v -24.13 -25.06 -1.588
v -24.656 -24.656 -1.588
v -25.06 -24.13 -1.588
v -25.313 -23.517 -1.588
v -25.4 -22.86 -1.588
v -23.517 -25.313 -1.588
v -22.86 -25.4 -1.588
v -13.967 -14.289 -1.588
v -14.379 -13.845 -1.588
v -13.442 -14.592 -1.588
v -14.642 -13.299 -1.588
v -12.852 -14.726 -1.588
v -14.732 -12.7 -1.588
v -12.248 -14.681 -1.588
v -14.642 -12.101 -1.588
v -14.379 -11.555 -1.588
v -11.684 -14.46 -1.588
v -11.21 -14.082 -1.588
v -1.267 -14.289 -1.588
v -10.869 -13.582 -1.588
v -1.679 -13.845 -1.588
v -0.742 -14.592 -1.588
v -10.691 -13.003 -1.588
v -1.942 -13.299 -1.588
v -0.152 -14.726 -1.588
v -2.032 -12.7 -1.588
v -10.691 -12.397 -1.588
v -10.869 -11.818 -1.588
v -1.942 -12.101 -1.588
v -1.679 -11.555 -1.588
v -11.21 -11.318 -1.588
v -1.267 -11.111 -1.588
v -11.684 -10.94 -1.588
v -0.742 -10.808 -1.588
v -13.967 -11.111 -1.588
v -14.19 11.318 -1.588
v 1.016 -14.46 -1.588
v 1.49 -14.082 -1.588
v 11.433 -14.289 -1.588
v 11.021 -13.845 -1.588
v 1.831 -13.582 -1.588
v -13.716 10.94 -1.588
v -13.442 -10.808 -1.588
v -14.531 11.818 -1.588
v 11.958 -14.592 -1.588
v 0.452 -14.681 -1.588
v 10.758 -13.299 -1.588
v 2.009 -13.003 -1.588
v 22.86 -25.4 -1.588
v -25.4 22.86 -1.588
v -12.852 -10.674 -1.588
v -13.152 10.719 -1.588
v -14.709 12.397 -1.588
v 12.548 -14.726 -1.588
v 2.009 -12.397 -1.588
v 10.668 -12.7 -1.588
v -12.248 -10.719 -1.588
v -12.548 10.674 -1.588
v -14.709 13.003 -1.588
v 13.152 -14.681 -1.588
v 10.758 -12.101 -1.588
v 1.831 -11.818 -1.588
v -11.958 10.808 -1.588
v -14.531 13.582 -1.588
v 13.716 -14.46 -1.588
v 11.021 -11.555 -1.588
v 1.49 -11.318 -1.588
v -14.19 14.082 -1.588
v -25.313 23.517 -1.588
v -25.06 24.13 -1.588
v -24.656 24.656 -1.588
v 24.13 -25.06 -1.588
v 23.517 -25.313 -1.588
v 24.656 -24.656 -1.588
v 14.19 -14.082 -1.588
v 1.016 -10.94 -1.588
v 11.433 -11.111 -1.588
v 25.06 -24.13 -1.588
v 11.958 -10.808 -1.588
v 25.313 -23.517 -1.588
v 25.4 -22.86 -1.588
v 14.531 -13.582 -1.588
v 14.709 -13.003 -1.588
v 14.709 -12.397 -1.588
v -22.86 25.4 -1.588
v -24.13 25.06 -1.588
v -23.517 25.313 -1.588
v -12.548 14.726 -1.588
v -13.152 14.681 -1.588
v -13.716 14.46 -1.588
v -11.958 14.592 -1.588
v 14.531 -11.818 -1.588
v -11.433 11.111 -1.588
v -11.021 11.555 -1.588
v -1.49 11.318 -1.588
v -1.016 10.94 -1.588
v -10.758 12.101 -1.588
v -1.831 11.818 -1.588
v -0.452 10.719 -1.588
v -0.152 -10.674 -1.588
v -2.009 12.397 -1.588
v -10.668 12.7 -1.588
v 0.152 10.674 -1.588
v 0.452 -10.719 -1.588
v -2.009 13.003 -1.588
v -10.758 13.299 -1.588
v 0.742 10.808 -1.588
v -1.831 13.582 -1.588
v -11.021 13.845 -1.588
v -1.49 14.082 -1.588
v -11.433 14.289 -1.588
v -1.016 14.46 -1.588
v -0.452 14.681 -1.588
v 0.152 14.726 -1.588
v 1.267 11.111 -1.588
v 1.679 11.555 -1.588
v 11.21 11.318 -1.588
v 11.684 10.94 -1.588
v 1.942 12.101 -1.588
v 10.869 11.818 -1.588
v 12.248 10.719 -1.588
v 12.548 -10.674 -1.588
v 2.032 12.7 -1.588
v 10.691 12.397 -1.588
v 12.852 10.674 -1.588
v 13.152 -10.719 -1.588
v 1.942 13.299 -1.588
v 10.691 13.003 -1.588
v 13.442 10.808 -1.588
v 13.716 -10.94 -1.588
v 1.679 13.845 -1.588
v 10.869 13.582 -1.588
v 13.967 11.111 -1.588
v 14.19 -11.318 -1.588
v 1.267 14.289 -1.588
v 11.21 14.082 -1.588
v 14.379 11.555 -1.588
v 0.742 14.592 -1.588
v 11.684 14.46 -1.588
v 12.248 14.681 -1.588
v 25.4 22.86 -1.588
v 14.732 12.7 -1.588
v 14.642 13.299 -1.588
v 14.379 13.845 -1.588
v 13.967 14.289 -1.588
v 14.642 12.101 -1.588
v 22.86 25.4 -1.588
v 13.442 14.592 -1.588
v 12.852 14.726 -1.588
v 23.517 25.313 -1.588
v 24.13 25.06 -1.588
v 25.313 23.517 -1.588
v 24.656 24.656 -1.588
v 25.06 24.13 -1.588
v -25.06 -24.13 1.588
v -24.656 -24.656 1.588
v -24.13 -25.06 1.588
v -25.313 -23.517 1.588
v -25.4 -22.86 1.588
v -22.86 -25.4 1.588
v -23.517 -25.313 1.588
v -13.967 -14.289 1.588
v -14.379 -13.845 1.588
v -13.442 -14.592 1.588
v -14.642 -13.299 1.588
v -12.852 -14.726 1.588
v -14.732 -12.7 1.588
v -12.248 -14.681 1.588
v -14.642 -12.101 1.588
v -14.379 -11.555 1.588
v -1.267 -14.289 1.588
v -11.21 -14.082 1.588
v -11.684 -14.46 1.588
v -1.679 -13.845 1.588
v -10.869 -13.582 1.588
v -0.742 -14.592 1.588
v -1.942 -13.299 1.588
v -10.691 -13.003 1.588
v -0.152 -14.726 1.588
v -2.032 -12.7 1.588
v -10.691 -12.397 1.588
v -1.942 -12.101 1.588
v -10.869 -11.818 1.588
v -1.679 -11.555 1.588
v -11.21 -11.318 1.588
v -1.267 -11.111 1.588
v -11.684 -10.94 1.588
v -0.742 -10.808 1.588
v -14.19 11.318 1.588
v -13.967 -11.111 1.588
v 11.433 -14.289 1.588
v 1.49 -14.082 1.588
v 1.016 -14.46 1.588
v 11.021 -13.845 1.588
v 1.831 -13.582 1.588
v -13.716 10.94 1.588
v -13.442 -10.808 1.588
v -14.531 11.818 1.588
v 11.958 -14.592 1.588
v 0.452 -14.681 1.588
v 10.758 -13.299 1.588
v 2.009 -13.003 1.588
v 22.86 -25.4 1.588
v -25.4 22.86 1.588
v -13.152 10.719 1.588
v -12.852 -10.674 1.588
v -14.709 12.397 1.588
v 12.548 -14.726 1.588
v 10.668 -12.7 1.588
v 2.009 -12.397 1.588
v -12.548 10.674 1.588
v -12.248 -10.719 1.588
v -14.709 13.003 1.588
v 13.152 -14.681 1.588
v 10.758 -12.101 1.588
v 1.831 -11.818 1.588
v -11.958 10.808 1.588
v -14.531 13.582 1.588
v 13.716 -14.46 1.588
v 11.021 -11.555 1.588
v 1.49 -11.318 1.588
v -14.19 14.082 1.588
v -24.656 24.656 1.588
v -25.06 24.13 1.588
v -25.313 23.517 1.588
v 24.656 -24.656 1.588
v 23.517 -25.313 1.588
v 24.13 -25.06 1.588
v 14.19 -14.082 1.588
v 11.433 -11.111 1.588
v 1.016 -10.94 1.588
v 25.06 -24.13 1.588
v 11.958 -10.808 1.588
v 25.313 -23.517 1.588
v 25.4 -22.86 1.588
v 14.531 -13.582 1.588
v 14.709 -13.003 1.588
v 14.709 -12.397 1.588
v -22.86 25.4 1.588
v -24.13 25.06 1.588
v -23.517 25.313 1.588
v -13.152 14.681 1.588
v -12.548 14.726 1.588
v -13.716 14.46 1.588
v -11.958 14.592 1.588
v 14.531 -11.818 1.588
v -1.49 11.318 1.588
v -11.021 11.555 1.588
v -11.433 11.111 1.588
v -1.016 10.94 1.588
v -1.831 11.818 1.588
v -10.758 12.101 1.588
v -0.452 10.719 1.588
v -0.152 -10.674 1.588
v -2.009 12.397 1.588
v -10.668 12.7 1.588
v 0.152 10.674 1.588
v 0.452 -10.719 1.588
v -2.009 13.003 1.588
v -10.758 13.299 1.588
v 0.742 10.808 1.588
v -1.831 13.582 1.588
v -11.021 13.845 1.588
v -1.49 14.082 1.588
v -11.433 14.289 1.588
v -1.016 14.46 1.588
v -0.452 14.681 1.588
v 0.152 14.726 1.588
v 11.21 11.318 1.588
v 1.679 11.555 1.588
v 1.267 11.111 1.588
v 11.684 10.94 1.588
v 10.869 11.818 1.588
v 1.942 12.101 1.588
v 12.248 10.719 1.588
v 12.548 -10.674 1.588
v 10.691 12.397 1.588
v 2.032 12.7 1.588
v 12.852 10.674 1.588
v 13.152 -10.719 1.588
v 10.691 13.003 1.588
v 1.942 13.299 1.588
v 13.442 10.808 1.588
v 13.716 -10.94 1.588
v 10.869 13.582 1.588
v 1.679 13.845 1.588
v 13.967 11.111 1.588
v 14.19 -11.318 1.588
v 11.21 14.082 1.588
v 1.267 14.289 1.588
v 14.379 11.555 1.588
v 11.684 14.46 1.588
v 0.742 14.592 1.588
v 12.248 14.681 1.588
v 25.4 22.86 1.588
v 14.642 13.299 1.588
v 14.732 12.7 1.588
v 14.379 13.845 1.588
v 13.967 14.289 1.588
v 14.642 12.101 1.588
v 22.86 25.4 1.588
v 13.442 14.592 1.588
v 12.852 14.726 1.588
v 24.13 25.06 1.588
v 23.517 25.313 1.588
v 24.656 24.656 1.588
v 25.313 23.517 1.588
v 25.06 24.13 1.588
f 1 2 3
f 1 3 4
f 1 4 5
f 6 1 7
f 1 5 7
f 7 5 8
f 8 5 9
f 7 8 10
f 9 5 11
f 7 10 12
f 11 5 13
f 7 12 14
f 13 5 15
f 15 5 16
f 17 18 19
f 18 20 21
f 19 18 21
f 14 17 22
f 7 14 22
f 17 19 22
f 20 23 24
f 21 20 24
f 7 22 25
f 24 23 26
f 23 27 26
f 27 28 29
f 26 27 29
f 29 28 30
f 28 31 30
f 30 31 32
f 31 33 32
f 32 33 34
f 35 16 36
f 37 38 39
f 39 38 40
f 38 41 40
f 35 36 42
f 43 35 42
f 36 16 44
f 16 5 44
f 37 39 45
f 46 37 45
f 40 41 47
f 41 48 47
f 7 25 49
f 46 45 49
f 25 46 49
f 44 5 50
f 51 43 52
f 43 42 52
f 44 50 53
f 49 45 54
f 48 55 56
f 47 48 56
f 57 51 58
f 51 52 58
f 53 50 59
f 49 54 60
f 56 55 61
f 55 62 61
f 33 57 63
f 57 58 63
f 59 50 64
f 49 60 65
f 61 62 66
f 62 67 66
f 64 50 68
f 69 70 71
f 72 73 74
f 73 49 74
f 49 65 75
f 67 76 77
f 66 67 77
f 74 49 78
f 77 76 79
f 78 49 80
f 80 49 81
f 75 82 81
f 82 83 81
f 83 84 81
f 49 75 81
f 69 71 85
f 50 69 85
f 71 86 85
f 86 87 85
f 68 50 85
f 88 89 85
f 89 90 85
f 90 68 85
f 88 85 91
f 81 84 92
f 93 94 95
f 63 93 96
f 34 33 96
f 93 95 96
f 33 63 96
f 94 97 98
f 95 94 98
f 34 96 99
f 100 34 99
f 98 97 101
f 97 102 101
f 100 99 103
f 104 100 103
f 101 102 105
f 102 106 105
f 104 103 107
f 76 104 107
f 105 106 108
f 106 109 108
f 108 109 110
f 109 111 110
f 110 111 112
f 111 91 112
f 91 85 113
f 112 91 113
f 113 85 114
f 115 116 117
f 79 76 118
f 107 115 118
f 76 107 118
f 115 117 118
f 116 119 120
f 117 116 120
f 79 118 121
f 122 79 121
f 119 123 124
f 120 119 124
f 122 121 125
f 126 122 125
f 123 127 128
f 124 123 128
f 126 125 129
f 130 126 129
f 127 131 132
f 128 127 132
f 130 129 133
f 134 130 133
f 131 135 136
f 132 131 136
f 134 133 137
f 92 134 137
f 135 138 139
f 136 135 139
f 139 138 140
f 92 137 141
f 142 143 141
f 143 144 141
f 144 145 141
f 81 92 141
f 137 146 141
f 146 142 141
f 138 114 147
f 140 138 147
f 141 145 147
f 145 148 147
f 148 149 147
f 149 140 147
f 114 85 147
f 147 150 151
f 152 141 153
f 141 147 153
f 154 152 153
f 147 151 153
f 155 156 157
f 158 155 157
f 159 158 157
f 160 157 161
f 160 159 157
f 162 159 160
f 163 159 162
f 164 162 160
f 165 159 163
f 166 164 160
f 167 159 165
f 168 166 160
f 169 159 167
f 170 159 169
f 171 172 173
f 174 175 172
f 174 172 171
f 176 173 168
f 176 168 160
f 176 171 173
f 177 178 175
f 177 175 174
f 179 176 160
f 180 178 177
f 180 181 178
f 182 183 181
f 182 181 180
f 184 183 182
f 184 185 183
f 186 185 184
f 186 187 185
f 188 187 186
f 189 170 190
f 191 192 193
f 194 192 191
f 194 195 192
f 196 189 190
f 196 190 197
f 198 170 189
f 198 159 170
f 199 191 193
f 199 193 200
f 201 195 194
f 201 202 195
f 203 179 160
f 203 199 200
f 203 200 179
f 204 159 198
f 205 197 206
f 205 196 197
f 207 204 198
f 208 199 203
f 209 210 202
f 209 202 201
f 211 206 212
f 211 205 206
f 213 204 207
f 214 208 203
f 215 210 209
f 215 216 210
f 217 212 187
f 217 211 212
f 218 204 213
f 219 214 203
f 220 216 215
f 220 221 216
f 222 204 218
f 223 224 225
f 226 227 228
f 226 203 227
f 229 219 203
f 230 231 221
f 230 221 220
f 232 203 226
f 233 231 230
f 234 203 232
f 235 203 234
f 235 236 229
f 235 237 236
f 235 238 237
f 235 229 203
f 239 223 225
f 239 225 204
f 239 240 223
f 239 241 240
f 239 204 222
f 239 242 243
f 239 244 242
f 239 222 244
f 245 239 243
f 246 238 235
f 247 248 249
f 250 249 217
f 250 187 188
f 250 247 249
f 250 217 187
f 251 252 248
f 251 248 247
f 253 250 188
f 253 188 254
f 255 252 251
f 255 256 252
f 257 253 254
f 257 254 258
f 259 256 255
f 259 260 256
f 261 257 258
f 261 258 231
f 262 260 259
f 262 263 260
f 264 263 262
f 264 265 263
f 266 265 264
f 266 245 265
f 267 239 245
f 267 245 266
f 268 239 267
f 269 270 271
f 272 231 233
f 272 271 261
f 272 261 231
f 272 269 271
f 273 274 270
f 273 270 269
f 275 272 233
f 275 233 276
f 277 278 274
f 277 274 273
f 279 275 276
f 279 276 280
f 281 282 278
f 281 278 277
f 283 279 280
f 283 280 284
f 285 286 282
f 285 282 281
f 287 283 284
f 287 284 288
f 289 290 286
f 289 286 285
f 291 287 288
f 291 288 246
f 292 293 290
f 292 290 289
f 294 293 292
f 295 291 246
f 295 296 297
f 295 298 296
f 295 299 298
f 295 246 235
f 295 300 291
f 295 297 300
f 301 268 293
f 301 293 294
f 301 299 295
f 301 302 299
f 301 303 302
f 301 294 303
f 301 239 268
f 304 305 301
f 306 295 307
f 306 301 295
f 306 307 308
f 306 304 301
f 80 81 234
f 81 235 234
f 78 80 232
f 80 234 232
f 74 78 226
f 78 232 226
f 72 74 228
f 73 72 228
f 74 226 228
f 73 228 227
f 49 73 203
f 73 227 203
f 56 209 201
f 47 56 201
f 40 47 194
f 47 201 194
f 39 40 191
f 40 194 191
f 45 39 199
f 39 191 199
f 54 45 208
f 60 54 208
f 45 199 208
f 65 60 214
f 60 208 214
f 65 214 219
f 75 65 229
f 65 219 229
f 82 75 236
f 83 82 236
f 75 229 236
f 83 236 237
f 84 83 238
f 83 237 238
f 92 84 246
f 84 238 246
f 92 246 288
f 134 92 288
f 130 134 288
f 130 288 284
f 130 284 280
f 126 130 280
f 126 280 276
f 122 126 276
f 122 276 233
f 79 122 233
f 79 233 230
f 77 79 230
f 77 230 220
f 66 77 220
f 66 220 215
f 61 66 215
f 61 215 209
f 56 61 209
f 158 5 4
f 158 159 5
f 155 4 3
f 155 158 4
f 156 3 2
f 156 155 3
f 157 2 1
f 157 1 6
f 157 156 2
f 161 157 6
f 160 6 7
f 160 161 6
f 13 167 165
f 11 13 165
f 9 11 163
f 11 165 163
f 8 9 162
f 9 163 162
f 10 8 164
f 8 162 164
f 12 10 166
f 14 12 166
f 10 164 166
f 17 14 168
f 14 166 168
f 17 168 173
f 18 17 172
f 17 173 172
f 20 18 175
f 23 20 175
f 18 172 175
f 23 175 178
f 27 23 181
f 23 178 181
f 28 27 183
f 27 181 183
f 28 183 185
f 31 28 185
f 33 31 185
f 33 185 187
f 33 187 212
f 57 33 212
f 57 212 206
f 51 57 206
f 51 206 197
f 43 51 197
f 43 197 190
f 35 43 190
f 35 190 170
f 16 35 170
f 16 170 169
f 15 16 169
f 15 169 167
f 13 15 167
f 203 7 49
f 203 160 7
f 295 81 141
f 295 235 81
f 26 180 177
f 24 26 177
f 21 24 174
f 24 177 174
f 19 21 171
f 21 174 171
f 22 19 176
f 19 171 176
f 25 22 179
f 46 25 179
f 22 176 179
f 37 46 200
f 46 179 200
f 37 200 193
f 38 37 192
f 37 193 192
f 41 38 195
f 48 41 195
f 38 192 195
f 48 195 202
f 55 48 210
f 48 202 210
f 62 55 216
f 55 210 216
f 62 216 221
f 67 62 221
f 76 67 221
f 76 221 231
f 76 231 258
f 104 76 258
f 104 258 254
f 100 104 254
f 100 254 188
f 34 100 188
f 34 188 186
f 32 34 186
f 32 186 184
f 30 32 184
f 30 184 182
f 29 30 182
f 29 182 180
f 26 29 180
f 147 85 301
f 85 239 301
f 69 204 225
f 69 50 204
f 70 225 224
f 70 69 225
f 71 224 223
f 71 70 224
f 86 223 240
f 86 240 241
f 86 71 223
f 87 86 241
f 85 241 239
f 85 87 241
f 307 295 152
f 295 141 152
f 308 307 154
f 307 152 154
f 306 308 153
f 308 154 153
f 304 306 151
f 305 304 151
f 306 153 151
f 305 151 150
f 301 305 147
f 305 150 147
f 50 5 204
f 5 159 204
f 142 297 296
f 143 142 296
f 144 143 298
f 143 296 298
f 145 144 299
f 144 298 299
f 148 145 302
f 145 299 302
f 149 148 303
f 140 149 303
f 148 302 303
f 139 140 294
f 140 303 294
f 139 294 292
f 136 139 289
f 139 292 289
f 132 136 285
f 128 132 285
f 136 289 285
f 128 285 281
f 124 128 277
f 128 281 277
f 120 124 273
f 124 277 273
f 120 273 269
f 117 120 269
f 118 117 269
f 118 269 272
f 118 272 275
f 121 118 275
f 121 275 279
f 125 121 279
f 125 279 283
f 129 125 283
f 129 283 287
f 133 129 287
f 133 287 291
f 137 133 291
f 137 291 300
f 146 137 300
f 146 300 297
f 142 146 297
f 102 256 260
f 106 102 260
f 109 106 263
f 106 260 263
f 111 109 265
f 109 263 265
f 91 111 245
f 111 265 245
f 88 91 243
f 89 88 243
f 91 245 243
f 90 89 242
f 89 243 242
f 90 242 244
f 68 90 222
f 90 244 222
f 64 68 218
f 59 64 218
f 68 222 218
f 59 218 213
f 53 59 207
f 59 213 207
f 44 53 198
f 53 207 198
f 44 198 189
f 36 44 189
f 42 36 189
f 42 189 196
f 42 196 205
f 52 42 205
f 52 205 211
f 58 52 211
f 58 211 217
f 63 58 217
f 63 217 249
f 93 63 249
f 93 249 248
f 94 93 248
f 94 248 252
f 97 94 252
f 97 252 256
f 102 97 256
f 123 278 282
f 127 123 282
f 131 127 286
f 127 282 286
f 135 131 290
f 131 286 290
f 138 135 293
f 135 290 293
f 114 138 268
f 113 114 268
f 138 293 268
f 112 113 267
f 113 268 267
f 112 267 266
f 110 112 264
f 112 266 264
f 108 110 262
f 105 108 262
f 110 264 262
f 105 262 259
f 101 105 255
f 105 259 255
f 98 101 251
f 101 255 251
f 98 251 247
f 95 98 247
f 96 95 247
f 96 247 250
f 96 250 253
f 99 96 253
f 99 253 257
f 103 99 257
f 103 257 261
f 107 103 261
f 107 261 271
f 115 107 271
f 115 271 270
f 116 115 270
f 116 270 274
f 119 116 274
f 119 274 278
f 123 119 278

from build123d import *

# Parameters (mm, degrees)
SKETCH1_W           = 50.8
SKETCH1_H           = 50.8
BOSS_EXTRUDE1_DEPTH = 1.5875
FILLET1_R           = 2.54
SKETCH2_R           = 2.032
CUT_EXTRUDE1_DEPTH  = 37.061067996


with BuildPart() as part:
    # Sketch1 → Boss-Extrude1 (new, symmetric)
    with BuildSketch(Plane.XY):
        Rectangle(SKETCH1_W, SKETCH1_H)
    extrude(amount=BOSS_EXTRUDE1_DEPTH, both=True)

    # Fillet1
    fillet1_edges = [part.edges().sort_by_distance(p)[0] for p in [
        (25.4, -25.4, 0),
        (-25.4, -25.4, 0),
        (-25.4, 25.4, 0),
        (25.4, 25.4, 0),
    ]]
    fillet(fillet1_edges, radius=FILLET1_R)

    # Sketch2 → Cut-Extrude1 (cut, through all)
    with BuildSketch(Plane.XY.offset(1.5875)):
        with Locations((-12.7, 12.7)):
            Circle(SKETCH2_R)
        with Locations((0, 12.7)):
            Circle(SKETCH2_R)
        with Locations((12.7, 12.7)):
            Circle(SKETCH2_R)
        with Locations(Location((12.7, -12.7, 0), (0, 0, 180))):
            Circle(SKETCH2_R)
        with Locations(Location((0, -12.7, 0), (0, 0, 180))):
            Circle(SKETCH2_R)
        with Locations(Location((-12.7, -12.7, 0), (0, 0, 180))):
            Circle(SKETCH2_R)
    extrude(amount=-CUT_EXTRUDE1_DEPTH, mode=Mode.SUBTRACT)


solid = part.part
